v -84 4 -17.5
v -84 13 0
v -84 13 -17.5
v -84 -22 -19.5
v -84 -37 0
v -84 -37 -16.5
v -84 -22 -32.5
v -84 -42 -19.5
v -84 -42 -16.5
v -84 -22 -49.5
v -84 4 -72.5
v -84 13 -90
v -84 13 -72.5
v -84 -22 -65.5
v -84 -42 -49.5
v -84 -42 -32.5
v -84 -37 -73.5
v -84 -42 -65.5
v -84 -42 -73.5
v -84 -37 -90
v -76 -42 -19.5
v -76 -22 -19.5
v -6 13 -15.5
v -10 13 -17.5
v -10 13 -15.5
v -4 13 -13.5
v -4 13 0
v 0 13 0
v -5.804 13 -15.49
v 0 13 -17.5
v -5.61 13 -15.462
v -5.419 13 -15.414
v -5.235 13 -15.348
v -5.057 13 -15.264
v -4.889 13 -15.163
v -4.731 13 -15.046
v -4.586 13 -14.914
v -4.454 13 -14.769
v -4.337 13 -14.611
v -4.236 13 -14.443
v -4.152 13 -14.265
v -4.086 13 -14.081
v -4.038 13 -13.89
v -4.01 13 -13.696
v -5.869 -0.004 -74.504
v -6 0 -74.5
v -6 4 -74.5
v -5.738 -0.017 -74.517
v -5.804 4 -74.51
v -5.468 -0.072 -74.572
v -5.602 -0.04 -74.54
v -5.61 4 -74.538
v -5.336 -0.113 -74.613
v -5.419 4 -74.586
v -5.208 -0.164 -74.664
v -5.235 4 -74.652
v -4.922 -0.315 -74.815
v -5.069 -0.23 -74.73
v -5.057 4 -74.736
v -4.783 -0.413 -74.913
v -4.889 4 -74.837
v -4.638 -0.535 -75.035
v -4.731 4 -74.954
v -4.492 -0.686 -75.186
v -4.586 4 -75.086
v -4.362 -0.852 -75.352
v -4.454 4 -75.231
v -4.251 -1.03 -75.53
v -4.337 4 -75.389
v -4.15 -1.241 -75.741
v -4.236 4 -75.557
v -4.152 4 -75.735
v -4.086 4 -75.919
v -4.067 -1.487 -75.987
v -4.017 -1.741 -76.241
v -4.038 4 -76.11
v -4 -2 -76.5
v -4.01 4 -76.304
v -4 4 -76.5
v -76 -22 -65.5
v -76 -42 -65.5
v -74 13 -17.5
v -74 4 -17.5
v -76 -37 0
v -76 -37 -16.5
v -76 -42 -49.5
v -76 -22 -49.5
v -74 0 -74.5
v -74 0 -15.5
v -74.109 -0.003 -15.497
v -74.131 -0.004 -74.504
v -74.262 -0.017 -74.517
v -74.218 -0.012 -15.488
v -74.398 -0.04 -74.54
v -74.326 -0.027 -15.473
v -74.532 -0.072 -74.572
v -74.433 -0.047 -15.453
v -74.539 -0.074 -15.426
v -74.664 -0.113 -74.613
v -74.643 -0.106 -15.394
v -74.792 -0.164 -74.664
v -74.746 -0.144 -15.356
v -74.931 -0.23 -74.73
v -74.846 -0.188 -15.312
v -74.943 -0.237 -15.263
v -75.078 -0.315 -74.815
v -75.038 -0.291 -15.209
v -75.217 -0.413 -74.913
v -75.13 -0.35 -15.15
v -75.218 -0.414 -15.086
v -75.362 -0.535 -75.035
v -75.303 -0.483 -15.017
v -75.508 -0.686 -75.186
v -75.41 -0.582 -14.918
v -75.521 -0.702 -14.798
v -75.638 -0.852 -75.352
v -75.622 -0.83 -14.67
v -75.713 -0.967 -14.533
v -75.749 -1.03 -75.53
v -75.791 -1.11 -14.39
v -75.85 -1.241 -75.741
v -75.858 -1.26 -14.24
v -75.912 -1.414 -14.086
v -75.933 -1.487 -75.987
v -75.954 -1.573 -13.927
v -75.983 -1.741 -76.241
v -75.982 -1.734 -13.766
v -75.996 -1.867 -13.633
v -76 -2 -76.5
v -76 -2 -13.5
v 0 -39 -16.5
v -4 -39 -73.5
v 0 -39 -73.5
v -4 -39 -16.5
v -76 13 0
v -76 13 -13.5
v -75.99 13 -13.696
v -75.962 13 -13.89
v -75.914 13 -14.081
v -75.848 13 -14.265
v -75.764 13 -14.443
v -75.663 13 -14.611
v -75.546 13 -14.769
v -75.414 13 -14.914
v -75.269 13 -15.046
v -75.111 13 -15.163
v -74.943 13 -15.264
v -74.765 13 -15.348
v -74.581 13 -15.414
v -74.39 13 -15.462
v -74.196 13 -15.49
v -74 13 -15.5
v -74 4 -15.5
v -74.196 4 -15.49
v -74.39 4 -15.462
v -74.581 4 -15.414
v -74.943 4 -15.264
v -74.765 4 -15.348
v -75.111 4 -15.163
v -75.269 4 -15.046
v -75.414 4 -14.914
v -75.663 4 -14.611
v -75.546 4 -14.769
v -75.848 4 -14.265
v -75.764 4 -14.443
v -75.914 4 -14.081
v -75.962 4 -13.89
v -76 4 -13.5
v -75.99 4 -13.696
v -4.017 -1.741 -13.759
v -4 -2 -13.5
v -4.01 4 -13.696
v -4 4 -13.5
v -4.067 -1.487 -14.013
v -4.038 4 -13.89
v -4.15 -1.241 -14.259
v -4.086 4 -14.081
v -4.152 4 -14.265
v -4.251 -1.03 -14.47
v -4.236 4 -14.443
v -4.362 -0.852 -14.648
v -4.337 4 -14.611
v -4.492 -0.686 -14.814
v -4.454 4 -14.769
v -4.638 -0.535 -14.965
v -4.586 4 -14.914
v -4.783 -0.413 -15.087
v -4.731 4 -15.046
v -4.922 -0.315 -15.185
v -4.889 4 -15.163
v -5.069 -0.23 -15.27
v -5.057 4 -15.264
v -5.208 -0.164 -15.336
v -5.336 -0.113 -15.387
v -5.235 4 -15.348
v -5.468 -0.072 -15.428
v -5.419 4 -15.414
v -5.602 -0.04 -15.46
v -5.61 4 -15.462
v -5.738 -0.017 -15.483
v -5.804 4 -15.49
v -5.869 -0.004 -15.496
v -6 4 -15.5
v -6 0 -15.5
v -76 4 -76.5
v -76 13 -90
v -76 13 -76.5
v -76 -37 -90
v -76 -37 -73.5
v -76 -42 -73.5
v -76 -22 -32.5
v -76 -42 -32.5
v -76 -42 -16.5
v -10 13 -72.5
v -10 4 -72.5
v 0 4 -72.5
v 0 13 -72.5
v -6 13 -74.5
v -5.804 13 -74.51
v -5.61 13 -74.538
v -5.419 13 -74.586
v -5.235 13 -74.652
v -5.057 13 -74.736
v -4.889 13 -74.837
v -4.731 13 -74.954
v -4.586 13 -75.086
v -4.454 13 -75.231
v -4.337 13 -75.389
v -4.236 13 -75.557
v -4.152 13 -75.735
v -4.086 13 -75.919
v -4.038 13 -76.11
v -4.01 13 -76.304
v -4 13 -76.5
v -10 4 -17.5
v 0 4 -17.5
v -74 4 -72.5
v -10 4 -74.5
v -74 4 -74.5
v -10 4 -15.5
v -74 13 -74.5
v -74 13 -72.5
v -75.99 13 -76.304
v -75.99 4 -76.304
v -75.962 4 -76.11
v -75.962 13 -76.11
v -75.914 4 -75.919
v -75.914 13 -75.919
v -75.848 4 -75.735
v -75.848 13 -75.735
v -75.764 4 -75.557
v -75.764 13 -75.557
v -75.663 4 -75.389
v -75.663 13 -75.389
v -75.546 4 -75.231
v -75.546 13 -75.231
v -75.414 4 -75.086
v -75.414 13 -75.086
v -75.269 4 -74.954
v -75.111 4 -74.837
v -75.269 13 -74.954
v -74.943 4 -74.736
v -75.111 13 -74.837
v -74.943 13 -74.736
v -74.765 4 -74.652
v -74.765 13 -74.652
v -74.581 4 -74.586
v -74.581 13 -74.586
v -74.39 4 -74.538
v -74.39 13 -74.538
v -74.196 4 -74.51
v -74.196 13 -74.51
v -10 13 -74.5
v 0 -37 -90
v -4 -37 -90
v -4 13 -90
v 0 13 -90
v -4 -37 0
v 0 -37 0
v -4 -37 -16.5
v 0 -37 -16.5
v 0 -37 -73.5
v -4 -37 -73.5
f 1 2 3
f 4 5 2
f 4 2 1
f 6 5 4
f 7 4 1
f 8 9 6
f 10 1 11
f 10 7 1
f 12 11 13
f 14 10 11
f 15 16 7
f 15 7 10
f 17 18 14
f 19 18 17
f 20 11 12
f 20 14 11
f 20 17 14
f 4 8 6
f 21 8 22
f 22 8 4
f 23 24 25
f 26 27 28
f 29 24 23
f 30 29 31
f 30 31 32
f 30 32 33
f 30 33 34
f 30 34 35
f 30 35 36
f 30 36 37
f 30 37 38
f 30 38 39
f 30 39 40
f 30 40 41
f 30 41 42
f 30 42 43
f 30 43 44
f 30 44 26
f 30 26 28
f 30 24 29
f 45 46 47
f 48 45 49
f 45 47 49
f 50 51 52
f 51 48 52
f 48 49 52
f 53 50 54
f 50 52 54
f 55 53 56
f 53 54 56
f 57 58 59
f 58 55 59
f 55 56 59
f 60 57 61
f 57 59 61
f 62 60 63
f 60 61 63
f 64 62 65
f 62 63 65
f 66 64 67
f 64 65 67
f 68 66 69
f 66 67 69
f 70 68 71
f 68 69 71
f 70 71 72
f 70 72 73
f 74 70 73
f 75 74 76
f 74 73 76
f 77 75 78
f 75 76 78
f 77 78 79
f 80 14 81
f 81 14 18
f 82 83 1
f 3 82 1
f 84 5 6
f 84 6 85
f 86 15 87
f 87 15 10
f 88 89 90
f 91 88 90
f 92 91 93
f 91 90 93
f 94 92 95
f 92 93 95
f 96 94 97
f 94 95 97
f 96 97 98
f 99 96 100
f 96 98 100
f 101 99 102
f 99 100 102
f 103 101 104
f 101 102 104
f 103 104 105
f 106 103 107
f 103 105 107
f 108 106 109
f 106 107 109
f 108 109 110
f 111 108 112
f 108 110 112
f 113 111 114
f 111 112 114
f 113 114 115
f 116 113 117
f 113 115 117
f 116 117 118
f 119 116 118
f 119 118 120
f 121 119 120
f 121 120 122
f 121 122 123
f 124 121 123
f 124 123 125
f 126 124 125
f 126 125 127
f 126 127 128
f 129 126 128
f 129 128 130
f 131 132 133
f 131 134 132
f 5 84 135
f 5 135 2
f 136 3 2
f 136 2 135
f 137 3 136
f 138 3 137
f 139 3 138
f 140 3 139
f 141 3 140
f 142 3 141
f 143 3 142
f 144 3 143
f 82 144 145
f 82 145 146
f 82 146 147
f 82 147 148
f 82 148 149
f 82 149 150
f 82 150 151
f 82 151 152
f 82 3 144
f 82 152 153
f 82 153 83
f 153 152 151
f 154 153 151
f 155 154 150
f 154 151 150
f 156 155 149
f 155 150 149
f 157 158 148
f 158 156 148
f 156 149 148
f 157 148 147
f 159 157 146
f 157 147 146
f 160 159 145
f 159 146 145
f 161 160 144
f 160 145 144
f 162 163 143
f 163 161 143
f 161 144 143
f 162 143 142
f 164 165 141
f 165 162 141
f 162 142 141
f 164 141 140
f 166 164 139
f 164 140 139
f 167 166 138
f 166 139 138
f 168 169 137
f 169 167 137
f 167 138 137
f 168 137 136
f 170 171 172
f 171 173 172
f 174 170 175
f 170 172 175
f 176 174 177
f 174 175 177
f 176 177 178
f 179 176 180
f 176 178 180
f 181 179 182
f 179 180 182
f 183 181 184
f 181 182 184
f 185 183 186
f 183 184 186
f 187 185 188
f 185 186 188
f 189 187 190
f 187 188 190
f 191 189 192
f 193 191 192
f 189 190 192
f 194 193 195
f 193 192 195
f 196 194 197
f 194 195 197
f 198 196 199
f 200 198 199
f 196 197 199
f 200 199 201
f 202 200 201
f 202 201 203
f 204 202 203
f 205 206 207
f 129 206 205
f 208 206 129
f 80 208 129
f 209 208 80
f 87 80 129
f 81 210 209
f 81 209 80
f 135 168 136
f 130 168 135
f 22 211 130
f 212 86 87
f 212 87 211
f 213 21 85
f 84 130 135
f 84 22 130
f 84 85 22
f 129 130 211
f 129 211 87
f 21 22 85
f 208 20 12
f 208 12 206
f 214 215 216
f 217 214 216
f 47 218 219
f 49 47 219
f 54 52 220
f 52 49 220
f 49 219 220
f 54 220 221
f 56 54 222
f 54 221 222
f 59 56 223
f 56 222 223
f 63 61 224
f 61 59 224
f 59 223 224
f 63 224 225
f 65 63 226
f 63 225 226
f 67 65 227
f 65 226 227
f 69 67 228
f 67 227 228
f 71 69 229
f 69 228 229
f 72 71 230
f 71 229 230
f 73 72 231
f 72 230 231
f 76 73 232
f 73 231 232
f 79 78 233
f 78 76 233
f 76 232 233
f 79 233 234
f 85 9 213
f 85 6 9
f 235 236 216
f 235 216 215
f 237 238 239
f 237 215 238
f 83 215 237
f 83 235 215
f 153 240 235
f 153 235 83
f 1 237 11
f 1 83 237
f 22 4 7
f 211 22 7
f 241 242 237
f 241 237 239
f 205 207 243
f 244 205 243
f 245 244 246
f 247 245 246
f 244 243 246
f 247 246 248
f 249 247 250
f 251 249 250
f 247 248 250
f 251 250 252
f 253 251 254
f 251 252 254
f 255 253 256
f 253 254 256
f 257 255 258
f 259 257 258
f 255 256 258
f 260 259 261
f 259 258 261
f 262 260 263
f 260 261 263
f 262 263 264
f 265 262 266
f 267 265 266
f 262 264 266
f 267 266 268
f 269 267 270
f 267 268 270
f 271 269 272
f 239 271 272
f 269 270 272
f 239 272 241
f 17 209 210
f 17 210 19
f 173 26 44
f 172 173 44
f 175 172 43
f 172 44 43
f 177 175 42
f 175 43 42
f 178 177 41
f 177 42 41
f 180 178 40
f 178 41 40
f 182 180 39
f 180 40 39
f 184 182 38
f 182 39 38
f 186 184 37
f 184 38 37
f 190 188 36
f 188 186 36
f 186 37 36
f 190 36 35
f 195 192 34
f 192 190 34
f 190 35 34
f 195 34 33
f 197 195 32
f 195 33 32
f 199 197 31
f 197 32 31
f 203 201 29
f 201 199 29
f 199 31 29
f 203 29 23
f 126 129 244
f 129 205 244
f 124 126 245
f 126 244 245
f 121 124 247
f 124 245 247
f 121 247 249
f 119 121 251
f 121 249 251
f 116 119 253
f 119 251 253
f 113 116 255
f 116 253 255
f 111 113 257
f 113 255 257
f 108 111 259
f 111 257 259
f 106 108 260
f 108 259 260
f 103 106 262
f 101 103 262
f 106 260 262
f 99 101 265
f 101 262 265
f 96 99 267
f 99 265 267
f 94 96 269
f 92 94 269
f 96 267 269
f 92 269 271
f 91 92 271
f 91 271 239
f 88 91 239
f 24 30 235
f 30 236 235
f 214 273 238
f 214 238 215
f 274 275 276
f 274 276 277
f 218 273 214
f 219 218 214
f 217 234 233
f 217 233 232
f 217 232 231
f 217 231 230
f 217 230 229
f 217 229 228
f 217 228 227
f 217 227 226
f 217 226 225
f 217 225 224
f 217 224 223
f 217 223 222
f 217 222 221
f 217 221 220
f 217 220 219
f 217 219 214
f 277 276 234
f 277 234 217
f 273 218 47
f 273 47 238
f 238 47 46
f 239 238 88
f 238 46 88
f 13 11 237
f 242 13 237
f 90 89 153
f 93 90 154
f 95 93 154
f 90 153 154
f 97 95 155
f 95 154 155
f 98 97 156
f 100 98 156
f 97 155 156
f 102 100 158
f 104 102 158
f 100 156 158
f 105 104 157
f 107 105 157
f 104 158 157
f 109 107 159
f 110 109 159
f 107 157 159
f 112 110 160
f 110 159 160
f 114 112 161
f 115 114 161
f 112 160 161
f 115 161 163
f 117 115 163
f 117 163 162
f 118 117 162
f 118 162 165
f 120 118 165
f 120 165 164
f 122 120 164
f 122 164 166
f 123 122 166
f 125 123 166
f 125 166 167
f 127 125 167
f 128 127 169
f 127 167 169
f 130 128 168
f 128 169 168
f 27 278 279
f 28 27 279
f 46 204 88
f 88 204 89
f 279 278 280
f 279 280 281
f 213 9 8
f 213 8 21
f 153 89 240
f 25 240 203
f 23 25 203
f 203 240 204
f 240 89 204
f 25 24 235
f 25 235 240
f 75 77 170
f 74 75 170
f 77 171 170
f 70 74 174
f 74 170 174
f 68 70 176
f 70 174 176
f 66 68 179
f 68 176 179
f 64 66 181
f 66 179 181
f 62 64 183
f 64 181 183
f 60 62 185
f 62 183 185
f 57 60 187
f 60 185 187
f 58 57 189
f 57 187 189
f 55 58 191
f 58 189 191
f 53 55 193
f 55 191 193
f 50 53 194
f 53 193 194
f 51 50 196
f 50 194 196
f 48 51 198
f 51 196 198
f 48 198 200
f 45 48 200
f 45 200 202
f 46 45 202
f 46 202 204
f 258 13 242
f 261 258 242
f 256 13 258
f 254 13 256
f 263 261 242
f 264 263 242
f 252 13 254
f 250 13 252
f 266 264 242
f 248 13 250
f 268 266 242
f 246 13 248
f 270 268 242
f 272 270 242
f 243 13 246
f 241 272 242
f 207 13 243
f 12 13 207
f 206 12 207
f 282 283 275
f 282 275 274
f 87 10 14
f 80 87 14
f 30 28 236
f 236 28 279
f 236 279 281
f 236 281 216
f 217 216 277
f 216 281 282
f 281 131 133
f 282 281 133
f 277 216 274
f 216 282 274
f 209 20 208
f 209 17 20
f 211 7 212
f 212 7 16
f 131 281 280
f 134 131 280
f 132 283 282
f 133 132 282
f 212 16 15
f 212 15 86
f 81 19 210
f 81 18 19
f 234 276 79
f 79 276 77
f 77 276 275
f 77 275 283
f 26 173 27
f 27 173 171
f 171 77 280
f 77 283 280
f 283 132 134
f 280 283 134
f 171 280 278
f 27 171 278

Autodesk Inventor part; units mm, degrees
ref_plane "YZ Plane" through (0, 0, 0) normal (1, 0, 0) x (0, 1, 0)
ref_plane "XZ Plane" through (0, 0, 0) normal (0, 1, 0) x (-1, 0, 0)
ref_plane "XY Plane" through (0, 0, 0) normal (0, 0, 1) x (1, 0, 0)
sketch "Sketch1" plane through (0, 0, 0) normal (0, 1, 0) x (-1, 0, 0)
  line L0 (0, 0) -> (84, 0)
  line L1 (84, 0) -> (84, -90)
  line L2 (84, -90) -> (0, -90)
  line L3 (0, -90) -> (0, 0)
  line L4 (84, 0) -> (76, 0)
  line L5 (76, 0) -> (4, 0)
  line L6 (4, 0) -> (4, -15.5)
  line L7 (4, -15.5) -> (76, -15.5)
  line L8 (76, -15.5) -> (76, 0)
  line L9 (84, -45) -> (0, -45) construction
  line L10 (4, -90) -> (4, -74.5)
  line L11 (4, -74.5) -> (76, -74.5)
  line L12 (76, -74.5) -> (76, -90)
  point P0 (4, 0)
  point P1 (4, -90)
  dimension "d0" = 84
  dimension "d1" = 90
  dimension "d4" = 8
  dimension "d5" = 72
  dimension "d6" = 15.5
extrude "Extrusion1" add sketch "Sketch1" along normal blind 4 contours L0 L6 L7 L8 L1 L2 L12 L11 L10 L3
sketch "Sketch2" plane through (0, 0, 0) normal (0, -1, 0) x (1, 0, 0)
  line L0 (-84, -90) -> (-84, 0) projected
  line L1 (-76, 0) -> (-76, -15.5) projected
  line L2 (-84, -90) -> (-76, -90)
  line L3 (-76, -90) -> (-76, 0)
  line L4 (-76, 0) -> (-84, 0)
  line L5 (-84, 0) -> (-84, -90)
  line L6 (0, -90) -> (0, 0)
  line L7 (0, 0) -> (0, -90) projected
  line L8 (-4, 0) -> (0, 0) projected
  line L9 (0, -90) -> (-4, -90)
  line L10 (-4, -90) -> (-4, 0)
  line L11 (-4, 0) -> (0, 0)
  line L12 (0, 0) -> (0, -90)
  dimension "d12" = 4
extrude "Extrusion2" add sketch "Sketch2" along normal blind 37
sketch "Sketch3" plane through (0, -37, 0) normal (0, -1, 0) x (1, 0, 0)
  line L0 (-76, -74.5) -> (-76, -90) projected
  line L1 (-76, -74.5) -> (-76, -73.5)
  line L2 (-76, -15.5) -> (-76, -74.5) projected
  line L3 (-76, -73.5) -> (-84, -73.5)
  line L4 (-84, -73.5) -> (-84, -16.5)
  line L5 (-84, -16.5) -> (-76, -16.5)
  line L6 (-76, -16.5) -> (-76, -73.5)
  point P0 (0, 0)
  dimension "d17" = 1
  dimension "d18" = 8
  dimension "d19" = 57
extrude "Extrusion3" add sketch "Sketch3" along normal blind 5
sketch "Sketch5" plane through (0, -37, 0) normal (0, -1, 0) x (1, 0, 0)
  line L0 (-4, -74.5) -> (-4, -73.5)
  line L1 (-4, -73.5) -> (-4, -73.5) construction
  line L2 (-4, 0) -> (-4, -90) projected
  line L3 (-4, -73.5) -> (0, -73.5)
  line L4 (0, -73.5) -> (0, -16.5)
  line L5 (0, -16.5) -> (-4, -16.5)
  line L6 (-4, -16.5) -> (-4, -73.5)
  point P0 (0, 0)
  dimension "d20" = 1
  dimension "d21" = 4
  dimension "d22" = 57
extrude "Extrusion4" add sketch "Sketch5" along normal blind 2
fillet "Fillet1" radius 2 6 edges at (-76, 2, -15.5) (-76, 0, -45) (-76, 2, -74.5) (-4, 2, -74.5) (-4, 0, -45) (-4, 2, -15.5)
sketch "Sketch6" plane through (0, 4, 0) normal (0, 1, 0) x (1, 0, 0)
  line L0 (-6, 74.5) -> (-74, 74.5) projected
  line L1 (-26.2554, 74.5) -> (0, 74.5) construction
  line L2 (0, 74.5) -> (-10, 74.5)
  line L3 (-10, 74.5) -> (-10, 72.5)
  line L4 (-10, 72.5) -> (0, 72.5)
  line L5 (0, 72.5) -> (0, 74.5)
  line L6 (-100.2554, 74.5) -> (-74, 74.5) construction
  line L7 (-84, 74.5) -> (-84, 72.5)
  line L8 (-84, 72.5) -> (-74, 72.5)
  line L9 (-74, 74.5) -> (-84, 74.5)
  line L10 (-74, 72.5) -> (-74, 74.5)
  line L11 (-26.2554, 17.5) -> (0, 17.5) construction
  line L12 (-10, 17.5) -> (-10, 15.5)
  line L13 (-10, 15.5) -> (0, 15.5)
  line L14 (0, 17.5) -> (-10, 17.5)
  line L15 (0, 15.5) -> (0, 17.5)
  line L16 (-100.2554, 17.5) -> (-74, 17.5) construction
  line L17 (-84, 17.5) -> (-84, 15.5)
  line L18 (-84, 15.5) -> (-74, 15.5)
  line L19 (-74, 17.5) -> (-84, 17.5)
  line L20 (-74, 15.5) -> (-74, 17.5)
  line L21 (-84, 0) -> (-76, 0) projected
  line L22 (-84, 0) -> (-76, 0)
  line L23 (-76, 0) -> (-76, 15.5)
  line L24 (-76, 15.5) -> (-84, 15.5)
  line L25 (-84, 15.5) -> (-84, 0)
  line L26 (-76, 76.5) -> (-76, 90) projected
  line L27 (-76, 90) -> (-84, 90)
  line L28 (-84, 90) -> (-84, 74.5)
  line L29 (-84, 74.5) -> (-76, 74.5)
  line L30 (-76, 74.5) -> (-76, 90)
  line L31 (-4, 90) -> (-4, 76.5) projected
  line L32 (-4, 90) -> (0, 90)
  line L33 (0, 90) -> (0, 74.5)
  line L34 (0, 74.5) -> (-4, 74.5)
  line L35 (-4, 74.5) -> (-4, 90)
  line L36 (-4, 0) -> (0, 0) projected
  line L37 (-4, 0) -> (0, 0)
  line L38 (0, 0) -> (0, 15.5)
  line L39 (0, 15.5) -> (-4, 15.5)
  line L40 (-4, 15.5) -> (-4, 0)
  dimension "d26" = 10
  dimension "d27" = 2
  dimension "d30" = 74
  dimension "d33" = 57
extrude "Extrusion5" add sketch "Sketch6" along normal blind 9
fillet "Fillet2" radius 2 4 edges at (-76, 8.5, -15.5) (-4, 8.5, -15.5) (-4, 8.5, -74.5) (-76, 8.5, -74.5)
sketch "Sketch8" plane through (-84, -42, -73.5) normal (-1, 0, 0) x (0, 0, 1)
  line L0 (-16.5, 5) -> (-16.5, 55) projected
  line L1 (-16.5, 5) -> (8, 5)
  line L2 (0, 3) -> (57, 3) projected
  line L3 (-16.5, 5) -> (8, 5) construction
  line L4 (24, 5) -> (24, 20)
  line L5 (24, 20) -> (8, 20)
  line L6 (8, 20) -> (8, 5)
  line L7 (57, 0) -> (0, 0) projected
  line L8 (8, 5) -> (8, 0)
  line L9 (8, 0) -> (24, 0)
  line L10 (24, 0) -> (24, 5)
  line L11 (73.5, 5) -> (73.5, 55) projected
  line L12 (73.5, 5) -> (54, 5)
  line L13 (54, 5) -> (54, 20)
  line L14 (54, 20) -> (73.5, 20)
  line L15 (73.5, 20) -> (73.5, 5)
  line L16 (54, 20) -> (41, 20)
  line L17 (41, 20) -> (41, 0)
  line L18 (41, 0) -> (54, 0)
  line L19 (54, 0) -> (54, 20)
  point P0 (73.5, 42)
  dimension "d39" = 24.5
  dimension "d40" = 0
  dimension "d41" = 16
  dimension "d42" = 15
  dimension "d44" = 19.5
  dimension "d45" = 15
  dimension "d46" = 13
extrude "Extrusion6" cut sketch "Sketch8" against normal up to surface (8 mm away) contours L8 L6 L5 L4 L10 L2 | L2 L10 L7 L8 | L17 L16 L13 L19 L2 | L2 L19 L7 L17
properties part number "Breadboard_insert"
